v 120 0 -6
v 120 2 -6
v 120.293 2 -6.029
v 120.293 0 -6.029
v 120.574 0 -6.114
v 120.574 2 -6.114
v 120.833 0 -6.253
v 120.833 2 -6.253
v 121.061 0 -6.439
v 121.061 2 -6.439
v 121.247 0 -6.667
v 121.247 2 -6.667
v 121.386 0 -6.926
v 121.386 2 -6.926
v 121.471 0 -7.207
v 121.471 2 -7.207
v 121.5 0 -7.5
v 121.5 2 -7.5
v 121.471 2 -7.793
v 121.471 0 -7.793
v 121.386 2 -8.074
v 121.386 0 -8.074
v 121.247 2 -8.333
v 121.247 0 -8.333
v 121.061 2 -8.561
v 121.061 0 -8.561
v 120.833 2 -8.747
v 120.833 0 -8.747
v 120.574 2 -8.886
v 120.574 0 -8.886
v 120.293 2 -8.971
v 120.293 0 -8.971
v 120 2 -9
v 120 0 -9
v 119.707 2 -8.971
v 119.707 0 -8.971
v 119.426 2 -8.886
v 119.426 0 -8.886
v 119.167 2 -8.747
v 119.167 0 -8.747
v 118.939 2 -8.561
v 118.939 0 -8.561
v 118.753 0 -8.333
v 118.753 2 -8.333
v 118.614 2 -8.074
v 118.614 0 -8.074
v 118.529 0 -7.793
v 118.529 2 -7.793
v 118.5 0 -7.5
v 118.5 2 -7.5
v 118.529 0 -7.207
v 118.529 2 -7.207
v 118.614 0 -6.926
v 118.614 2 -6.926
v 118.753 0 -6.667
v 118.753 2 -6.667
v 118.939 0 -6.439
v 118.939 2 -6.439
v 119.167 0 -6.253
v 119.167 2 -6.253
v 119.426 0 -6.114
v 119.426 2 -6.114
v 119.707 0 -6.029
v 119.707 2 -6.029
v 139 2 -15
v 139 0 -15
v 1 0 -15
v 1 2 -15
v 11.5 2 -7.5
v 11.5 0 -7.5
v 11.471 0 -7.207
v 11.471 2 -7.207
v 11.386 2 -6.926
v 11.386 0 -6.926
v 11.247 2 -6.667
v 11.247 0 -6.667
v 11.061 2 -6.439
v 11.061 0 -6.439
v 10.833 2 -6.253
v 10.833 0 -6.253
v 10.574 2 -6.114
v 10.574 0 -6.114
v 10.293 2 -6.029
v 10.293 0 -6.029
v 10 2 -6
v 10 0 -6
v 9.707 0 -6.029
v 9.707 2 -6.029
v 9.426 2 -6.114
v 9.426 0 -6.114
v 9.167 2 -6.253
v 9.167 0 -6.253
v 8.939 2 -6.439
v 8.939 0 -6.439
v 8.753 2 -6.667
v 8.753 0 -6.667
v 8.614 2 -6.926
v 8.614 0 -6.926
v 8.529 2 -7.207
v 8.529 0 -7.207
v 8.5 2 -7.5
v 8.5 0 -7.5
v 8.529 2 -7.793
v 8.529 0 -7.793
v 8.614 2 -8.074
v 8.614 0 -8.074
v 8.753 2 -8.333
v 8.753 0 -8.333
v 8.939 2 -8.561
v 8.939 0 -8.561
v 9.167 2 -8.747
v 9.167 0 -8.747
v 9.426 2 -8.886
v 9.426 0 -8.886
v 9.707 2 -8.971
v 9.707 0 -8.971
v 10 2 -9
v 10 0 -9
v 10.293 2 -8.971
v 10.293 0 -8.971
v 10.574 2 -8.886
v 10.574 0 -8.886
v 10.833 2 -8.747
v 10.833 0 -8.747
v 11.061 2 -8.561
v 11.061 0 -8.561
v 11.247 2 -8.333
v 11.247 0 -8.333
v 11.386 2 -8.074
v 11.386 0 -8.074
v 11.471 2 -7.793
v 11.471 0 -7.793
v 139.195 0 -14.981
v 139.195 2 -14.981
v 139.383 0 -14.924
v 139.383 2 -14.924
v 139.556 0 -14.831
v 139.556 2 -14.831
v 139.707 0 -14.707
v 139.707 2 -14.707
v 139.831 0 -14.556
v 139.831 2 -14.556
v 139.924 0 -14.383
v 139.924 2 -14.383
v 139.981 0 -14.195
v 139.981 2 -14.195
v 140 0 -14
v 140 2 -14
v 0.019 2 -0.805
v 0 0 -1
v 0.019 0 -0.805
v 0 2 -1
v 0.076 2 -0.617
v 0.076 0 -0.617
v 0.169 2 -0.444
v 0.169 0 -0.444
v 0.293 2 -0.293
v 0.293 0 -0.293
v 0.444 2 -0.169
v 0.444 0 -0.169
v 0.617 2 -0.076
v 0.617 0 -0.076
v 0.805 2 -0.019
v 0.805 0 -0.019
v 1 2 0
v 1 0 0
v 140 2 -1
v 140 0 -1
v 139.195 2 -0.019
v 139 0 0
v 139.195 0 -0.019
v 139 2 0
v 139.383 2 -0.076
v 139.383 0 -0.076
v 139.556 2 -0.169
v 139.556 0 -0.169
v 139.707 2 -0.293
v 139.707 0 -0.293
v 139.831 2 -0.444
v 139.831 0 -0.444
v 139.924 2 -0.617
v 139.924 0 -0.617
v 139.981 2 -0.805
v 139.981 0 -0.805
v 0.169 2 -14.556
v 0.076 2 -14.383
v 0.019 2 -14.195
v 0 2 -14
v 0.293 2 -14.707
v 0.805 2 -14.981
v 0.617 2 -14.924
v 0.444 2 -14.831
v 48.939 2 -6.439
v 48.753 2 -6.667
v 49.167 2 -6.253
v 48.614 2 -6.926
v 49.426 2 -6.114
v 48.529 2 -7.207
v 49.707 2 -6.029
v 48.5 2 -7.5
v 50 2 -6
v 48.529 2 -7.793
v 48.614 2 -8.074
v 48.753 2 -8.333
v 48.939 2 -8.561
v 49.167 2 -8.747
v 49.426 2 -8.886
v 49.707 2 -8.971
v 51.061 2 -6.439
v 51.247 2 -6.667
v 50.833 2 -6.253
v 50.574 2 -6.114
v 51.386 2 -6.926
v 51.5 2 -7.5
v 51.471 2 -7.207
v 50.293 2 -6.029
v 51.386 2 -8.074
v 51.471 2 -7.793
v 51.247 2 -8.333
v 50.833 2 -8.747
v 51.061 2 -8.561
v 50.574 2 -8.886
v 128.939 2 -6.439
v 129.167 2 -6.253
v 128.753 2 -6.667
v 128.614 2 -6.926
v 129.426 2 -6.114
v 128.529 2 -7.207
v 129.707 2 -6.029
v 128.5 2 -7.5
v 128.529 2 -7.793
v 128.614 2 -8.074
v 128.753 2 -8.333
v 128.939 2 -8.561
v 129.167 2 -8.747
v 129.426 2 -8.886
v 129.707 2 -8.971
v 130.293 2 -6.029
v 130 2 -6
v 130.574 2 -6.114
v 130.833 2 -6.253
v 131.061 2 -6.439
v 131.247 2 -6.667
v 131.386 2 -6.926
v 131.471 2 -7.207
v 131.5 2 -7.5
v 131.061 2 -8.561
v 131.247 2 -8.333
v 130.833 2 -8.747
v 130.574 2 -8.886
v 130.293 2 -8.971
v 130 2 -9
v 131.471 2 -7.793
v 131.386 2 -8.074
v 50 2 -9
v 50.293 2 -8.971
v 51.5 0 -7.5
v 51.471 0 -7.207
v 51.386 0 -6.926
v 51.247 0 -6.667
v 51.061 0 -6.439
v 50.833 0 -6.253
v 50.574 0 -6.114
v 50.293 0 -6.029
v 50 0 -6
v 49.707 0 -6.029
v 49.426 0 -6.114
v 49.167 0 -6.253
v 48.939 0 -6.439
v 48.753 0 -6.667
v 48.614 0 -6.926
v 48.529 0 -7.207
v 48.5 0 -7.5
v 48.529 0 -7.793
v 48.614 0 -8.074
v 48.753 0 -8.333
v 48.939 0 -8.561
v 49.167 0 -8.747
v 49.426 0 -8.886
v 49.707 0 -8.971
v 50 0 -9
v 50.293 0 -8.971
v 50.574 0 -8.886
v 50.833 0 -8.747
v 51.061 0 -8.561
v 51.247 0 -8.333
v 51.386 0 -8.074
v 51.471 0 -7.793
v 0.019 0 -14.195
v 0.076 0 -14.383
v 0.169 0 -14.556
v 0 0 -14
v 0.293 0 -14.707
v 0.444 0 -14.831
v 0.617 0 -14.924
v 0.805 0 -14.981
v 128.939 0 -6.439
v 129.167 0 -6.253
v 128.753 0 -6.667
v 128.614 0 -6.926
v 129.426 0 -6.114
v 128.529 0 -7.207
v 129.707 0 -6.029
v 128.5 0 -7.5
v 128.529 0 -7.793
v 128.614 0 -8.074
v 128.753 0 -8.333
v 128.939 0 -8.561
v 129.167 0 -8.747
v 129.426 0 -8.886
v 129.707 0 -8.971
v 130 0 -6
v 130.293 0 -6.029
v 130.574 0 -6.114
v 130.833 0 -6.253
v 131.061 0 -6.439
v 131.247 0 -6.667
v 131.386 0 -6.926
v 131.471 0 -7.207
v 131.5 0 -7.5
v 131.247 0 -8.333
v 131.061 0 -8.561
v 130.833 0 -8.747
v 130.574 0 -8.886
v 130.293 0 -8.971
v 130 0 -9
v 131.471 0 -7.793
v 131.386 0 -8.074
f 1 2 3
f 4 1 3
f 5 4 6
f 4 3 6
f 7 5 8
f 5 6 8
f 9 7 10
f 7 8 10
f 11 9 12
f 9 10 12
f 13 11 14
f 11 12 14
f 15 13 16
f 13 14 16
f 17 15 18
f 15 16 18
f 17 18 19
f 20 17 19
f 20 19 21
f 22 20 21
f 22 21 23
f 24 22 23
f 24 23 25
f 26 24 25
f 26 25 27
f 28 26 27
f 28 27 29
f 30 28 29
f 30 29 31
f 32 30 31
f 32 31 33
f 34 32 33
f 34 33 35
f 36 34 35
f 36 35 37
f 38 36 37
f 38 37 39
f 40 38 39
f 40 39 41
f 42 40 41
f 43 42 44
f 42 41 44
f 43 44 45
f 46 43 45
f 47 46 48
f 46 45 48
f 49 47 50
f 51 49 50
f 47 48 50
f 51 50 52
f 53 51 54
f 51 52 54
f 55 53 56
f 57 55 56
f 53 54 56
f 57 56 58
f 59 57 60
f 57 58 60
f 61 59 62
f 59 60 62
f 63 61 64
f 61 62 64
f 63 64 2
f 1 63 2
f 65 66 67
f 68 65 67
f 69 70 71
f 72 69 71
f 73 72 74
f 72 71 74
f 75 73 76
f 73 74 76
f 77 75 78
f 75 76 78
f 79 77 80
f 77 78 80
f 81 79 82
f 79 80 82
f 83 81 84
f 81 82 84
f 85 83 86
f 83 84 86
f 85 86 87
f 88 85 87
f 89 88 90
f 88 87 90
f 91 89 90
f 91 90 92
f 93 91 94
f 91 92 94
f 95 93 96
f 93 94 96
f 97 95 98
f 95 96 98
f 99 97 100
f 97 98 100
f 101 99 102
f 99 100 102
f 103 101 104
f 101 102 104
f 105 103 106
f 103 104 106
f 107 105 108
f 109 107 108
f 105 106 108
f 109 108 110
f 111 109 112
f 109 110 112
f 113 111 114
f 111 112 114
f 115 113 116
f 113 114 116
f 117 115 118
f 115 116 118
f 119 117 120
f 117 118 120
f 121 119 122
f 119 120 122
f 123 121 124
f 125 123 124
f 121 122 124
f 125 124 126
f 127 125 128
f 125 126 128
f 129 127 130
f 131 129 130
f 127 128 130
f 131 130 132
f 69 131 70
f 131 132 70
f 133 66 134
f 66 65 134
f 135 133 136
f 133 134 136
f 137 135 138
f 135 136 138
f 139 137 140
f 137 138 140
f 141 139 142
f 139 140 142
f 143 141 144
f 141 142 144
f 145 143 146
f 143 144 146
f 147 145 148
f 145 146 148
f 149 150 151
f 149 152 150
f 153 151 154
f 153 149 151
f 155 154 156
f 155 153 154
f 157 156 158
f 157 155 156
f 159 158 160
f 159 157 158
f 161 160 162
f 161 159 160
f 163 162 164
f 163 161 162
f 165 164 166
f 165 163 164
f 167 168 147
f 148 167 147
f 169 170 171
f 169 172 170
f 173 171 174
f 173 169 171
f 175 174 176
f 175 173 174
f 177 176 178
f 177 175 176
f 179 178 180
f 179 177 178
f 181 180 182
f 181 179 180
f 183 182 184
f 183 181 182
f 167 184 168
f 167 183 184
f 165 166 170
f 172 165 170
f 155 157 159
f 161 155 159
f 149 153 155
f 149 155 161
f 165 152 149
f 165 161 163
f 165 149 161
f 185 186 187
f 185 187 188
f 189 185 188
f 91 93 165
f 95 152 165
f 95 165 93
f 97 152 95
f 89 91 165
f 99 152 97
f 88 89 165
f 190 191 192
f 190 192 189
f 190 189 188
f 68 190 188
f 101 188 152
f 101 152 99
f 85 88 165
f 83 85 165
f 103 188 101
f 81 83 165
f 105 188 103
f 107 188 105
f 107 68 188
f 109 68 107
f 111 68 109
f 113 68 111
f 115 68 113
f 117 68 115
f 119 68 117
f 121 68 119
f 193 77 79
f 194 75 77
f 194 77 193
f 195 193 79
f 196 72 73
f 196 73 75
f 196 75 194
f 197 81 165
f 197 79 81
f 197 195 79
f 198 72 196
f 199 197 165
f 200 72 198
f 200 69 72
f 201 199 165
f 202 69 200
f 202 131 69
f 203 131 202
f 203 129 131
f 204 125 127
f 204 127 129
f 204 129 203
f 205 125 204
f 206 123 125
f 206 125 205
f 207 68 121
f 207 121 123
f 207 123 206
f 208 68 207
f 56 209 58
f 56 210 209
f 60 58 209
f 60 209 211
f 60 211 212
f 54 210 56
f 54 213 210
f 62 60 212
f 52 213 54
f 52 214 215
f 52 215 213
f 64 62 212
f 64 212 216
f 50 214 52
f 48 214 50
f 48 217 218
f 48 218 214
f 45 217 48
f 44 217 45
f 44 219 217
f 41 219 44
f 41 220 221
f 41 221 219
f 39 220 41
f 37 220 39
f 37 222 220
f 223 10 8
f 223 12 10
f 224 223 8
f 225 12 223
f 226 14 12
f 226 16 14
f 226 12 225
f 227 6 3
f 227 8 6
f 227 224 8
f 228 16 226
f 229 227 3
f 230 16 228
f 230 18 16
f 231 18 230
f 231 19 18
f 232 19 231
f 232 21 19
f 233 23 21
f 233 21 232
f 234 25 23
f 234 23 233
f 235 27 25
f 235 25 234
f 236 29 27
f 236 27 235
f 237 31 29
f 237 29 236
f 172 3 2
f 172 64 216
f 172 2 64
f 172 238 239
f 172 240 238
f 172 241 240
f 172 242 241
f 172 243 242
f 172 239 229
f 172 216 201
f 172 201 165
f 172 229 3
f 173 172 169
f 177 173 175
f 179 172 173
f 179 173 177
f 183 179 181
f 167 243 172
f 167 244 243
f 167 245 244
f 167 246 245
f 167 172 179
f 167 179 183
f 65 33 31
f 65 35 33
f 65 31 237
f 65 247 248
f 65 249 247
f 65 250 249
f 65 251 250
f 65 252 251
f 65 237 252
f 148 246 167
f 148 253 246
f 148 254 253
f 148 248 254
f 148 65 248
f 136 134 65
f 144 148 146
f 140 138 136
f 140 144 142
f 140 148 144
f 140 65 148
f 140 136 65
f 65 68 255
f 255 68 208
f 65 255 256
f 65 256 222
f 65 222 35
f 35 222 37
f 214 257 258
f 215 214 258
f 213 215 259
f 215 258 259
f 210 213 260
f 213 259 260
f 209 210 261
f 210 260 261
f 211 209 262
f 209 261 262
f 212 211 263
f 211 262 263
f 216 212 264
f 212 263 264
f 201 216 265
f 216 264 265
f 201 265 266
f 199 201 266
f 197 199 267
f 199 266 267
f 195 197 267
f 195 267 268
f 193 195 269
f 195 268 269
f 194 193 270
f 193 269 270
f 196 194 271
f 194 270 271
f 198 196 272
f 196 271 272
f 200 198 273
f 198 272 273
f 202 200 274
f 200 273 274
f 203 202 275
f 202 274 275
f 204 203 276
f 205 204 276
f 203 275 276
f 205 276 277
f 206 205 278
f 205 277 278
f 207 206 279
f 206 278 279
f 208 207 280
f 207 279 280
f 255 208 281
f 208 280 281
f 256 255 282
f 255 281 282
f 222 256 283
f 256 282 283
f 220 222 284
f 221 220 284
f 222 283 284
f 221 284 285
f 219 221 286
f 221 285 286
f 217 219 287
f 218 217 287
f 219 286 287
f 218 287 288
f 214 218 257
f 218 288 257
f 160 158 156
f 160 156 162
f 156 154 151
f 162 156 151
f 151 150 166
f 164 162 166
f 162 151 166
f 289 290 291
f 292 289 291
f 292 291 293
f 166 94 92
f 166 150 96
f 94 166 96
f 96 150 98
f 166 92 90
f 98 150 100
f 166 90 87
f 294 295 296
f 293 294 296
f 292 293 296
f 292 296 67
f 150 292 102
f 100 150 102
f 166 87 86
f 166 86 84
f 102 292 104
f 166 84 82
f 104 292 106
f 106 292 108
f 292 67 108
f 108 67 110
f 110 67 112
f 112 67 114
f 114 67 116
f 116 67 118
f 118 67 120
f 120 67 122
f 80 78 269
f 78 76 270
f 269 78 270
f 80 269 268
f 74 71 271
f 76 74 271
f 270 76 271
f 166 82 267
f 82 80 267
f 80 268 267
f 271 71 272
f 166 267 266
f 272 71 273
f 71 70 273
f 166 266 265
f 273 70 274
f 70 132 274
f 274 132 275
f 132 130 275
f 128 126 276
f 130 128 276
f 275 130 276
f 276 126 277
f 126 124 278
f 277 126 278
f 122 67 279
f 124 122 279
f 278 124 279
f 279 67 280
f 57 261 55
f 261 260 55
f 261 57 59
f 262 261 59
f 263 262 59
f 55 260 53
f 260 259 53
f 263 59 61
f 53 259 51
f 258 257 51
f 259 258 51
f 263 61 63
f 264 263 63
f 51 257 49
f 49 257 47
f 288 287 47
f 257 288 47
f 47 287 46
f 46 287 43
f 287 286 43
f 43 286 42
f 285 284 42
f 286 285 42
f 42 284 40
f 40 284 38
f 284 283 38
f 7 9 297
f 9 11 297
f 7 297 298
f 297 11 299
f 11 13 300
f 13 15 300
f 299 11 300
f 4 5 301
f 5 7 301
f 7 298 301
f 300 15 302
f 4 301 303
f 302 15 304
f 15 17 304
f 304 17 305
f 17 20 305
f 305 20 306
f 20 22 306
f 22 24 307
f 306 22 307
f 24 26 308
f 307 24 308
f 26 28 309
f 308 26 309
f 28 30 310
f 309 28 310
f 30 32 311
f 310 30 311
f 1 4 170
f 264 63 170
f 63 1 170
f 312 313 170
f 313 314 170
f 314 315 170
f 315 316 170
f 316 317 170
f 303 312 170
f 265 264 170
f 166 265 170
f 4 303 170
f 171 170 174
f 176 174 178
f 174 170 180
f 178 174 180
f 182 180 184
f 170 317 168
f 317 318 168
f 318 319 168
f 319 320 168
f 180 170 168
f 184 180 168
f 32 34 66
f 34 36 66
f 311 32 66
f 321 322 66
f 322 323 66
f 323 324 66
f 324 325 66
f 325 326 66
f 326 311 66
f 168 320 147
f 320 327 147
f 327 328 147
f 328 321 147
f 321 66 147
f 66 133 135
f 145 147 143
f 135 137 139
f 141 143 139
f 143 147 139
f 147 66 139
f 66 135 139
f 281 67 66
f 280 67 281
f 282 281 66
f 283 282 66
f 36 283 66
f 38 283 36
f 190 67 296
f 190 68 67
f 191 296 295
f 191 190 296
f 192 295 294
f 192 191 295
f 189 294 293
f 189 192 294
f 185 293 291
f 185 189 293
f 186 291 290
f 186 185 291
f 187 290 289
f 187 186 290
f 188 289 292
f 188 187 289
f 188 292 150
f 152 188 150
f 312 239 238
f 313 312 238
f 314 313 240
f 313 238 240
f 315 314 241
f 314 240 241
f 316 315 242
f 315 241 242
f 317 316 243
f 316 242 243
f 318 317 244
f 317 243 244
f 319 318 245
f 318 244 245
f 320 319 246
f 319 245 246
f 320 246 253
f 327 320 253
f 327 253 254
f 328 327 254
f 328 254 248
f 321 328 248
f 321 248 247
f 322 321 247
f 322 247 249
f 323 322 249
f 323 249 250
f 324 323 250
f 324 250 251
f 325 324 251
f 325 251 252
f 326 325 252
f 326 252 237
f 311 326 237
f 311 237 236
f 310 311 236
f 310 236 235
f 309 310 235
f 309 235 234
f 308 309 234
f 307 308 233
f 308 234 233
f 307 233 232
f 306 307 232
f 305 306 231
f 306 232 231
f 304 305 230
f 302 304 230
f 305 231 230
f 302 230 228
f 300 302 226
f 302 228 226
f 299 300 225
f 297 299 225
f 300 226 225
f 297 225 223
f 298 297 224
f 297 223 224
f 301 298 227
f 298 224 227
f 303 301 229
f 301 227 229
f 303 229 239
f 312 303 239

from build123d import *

# Parameters (mm, degrees)
BOSS_EXTRUDE1_DEPTH = 2
FILLET1_R           = 1
SKETCH2_R           = 1.5
CUT_EXTRUDE1_DEPTH  = 10


with BuildPart() as part:
    # Sketch1 → Boss-Extrude1 (new body)
    with BuildSketch(Plane(origin=(0, 0, 0), x_dir=(1, 0, 0), z_dir=(0, 1, 0))):
        with BuildLine():
            ThreePointArc((48.5, 7.5), (50, 9), (51.5, 7.5))
            Line((51.5, 7.5), (140, 7.5))
            Line((140, 7.5), (140, 15))
            Line((140, 15), (0, 15))
            Line((0, 15), (0, 7.5))
            Line((0, 7.5), (8.5, 7.5))
            ThreePointArc((8.5, 7.5), (10, 9), (11.5, 7.5))
            Line((11.5, 7.5), (48.5, 7.5))
        make_face()
        with BuildLine():
            Line((140, 7.5), (51.5, 7.5))
            ThreePointArc((51.5, 7.5), (50, 6), (48.5, 7.5))
            Line((48.5, 7.5), (11.5, 7.5))
            ThreePointArc((11.5, 7.5), (10, 6), (8.5, 7.5))
            Line((8.5, 7.5), (0, 7.5))
            Line((0, 7.5), (0, 0))
            Line((0, 0), (140, 0))
            Line((140, 0), (140, 7.5))
        make_face()
    extrude(amount=BOSS_EXTRUDE1_DEPTH)

    # Fillet1
    fillet1_edges = [part.edges().sort_by_distance(p)[0] for p in [
        (0, 1, 0),
        (0, 1, -15),
        (140, 1, -15),
        (140, 1, 0),
    ]]
    fillet(fillet1_edges, radius=FILLET1_R)

    # Sketch2 → Cut-Extrude1 (cut)
    with BuildSketch(Plane(origin=(0, 2, 0), x_dir=(1, 0, 0), z_dir=(0, 1, 0))):
        with Locations(Location((130, 7.5, 0), (0, 0, 270))):
            Circle(SKETCH2_R)
        with Locations(Location((120, 7.5, 0), (0, 0, 270))):
            Circle(SKETCH2_R)
    extrude(amount=-CUT_EXTRUDE1_DEPTH, mode=Mode.SUBTRACT)


solid = part.part
